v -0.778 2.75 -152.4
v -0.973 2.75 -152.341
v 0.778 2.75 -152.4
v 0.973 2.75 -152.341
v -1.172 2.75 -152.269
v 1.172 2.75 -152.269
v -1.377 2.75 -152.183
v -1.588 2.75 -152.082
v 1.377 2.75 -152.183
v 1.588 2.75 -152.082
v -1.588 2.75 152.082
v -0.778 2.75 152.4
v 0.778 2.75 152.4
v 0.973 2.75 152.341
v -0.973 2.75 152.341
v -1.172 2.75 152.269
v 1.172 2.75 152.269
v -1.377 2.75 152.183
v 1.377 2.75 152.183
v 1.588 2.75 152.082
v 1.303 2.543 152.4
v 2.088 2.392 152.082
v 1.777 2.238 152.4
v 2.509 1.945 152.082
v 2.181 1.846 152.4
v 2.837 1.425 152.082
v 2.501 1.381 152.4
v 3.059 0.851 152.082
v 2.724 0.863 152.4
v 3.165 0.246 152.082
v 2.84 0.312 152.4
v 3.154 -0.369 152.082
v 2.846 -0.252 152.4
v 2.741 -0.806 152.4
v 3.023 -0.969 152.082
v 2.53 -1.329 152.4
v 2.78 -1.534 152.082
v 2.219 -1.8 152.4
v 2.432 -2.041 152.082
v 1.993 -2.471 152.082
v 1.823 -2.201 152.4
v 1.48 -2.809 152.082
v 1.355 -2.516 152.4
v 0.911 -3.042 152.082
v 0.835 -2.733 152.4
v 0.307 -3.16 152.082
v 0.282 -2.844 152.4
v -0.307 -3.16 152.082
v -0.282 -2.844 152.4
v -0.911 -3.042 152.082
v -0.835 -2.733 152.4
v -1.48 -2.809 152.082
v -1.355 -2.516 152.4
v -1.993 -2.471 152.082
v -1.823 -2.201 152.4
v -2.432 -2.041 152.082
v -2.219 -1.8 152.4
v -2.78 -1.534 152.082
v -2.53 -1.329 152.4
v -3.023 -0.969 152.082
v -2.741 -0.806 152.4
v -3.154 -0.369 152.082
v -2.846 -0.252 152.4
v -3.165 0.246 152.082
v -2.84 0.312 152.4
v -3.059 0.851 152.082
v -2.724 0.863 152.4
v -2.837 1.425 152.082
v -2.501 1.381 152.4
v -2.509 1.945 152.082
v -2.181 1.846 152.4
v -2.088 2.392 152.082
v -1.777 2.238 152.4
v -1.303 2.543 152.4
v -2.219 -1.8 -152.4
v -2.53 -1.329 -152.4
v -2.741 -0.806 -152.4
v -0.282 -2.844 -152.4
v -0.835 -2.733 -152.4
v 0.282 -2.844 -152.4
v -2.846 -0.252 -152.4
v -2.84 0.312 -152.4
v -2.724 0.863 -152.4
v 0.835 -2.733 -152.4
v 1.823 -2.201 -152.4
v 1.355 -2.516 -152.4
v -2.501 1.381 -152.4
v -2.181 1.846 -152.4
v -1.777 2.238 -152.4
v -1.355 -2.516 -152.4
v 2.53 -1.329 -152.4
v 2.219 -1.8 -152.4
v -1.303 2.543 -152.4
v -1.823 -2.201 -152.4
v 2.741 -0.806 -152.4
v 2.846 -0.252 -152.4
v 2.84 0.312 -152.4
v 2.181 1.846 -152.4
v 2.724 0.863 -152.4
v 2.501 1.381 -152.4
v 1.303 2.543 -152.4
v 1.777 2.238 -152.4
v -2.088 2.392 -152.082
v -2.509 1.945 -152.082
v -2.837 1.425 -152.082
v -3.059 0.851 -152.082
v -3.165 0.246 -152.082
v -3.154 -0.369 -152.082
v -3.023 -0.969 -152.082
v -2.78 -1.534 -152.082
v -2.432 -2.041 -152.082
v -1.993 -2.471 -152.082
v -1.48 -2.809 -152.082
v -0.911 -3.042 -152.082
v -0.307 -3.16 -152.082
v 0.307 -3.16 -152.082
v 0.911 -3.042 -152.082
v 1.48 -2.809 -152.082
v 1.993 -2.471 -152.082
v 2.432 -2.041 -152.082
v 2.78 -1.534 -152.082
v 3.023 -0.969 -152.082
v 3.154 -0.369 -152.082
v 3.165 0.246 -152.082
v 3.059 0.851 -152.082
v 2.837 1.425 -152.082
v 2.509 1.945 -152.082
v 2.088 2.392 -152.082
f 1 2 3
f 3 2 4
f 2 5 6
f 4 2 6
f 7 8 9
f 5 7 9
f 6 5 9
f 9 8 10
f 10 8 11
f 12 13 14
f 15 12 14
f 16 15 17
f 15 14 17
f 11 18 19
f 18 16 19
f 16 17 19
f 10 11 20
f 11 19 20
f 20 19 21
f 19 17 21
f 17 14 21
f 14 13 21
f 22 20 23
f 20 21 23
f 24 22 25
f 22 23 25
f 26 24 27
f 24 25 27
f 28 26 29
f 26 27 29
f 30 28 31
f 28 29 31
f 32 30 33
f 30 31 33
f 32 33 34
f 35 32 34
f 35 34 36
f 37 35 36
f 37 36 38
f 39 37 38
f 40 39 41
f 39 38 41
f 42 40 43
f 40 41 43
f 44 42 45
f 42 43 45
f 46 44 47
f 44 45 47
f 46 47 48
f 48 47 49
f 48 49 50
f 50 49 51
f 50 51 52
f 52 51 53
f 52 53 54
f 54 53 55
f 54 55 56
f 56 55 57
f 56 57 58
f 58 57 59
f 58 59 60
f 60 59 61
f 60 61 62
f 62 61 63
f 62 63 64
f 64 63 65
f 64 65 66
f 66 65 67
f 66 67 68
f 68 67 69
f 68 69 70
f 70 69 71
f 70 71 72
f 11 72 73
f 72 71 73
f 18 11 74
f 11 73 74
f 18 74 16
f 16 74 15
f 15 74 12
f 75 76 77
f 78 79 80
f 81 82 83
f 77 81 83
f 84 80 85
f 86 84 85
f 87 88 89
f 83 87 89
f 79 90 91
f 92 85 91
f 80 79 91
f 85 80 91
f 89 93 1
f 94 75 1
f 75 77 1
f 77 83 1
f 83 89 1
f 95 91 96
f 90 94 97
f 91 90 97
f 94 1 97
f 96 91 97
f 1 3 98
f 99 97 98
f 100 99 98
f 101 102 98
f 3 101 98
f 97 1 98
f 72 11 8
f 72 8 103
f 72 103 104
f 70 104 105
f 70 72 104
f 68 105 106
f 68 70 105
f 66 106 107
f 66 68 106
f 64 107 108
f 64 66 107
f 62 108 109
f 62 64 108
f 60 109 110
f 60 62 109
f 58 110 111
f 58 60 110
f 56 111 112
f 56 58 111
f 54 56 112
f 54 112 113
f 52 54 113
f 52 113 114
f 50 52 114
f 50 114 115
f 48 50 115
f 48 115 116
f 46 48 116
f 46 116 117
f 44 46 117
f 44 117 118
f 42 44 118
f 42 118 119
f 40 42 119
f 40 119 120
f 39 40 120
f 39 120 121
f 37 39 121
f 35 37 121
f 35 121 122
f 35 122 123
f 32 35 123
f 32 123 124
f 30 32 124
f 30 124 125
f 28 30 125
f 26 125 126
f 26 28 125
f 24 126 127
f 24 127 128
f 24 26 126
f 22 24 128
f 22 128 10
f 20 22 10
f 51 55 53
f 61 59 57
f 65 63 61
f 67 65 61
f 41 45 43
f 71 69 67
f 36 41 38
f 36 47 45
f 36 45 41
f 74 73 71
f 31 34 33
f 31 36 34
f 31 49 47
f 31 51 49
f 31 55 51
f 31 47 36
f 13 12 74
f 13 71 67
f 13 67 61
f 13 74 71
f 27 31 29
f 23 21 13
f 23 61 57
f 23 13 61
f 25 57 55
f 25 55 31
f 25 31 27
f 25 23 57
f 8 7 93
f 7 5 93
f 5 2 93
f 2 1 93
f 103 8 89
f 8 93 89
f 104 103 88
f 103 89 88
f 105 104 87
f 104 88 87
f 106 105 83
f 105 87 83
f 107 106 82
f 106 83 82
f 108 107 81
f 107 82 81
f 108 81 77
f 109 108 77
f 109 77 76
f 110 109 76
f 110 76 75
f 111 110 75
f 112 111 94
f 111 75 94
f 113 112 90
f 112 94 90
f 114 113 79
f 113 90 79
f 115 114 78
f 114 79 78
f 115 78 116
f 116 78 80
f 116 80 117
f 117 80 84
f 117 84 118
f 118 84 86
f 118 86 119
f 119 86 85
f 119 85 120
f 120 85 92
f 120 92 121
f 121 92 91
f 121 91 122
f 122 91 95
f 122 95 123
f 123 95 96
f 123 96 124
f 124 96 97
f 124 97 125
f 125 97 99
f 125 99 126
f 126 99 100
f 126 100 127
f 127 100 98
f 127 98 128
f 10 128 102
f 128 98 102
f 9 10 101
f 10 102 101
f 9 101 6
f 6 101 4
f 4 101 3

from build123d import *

# Parameters (mm, degrees)
SKETCH3_R                = 3.175
BOSS_EXTRUDE2_DEPTH      = 152.4
BOSS_EXTRUDE2_DEPTH_BACK = 152.4
CUT_EXTRUDE5_DEPTH       = 153.4
CUT_EXTRUDE5_DEPTH_BACK  = 153.4
CHAMFER1_SIZE            = 0.3175


with BuildPart() as part:
    # Sketch3 → Boss-Extrude2 (new body, two sides)
    with BuildSketch(Plane.XY) as boss_extrude2_sk:
        Circle(SKETCH3_R)
    extrude(amount=BOSS_EXTRUDE2_DEPTH)
    extrude(boss_extrude2_sk.sketch, amount=-BOSS_EXTRUDE2_DEPTH_BACK)

    # Sketch10 → Cut-Extrude5 (cut, two sides)
    with BuildSketch(Plane.XY) as cut_extrude5_sk:
        with BuildLine():
            Line((-1.5875, 2.749630657), (1.5875, 2.749630657))
            ThreePointArc((1.5875, 2.749630657), (0, 3.175), (-1.5875, 2.749630657))
        make_face()
    extrude(amount=CUT_EXTRUDE5_DEPTH, mode=Mode.SUBTRACT)
    extrude(cut_extrude5_sk.sketch, amount=-CUT_EXTRUDE5_DEPTH_BACK, mode=Mode.SUBTRACT)

    # Chamfer1
    chamfer1_edges = [part.edges().sort_by_distance(p)[0] for p in [
        (0, -3.175, -152.4),
        (0, -3.175, 152.4),
    ]]
    chamfer(chamfer1_edges, length=CHAMFER1_SIZE)


solid = part.part
